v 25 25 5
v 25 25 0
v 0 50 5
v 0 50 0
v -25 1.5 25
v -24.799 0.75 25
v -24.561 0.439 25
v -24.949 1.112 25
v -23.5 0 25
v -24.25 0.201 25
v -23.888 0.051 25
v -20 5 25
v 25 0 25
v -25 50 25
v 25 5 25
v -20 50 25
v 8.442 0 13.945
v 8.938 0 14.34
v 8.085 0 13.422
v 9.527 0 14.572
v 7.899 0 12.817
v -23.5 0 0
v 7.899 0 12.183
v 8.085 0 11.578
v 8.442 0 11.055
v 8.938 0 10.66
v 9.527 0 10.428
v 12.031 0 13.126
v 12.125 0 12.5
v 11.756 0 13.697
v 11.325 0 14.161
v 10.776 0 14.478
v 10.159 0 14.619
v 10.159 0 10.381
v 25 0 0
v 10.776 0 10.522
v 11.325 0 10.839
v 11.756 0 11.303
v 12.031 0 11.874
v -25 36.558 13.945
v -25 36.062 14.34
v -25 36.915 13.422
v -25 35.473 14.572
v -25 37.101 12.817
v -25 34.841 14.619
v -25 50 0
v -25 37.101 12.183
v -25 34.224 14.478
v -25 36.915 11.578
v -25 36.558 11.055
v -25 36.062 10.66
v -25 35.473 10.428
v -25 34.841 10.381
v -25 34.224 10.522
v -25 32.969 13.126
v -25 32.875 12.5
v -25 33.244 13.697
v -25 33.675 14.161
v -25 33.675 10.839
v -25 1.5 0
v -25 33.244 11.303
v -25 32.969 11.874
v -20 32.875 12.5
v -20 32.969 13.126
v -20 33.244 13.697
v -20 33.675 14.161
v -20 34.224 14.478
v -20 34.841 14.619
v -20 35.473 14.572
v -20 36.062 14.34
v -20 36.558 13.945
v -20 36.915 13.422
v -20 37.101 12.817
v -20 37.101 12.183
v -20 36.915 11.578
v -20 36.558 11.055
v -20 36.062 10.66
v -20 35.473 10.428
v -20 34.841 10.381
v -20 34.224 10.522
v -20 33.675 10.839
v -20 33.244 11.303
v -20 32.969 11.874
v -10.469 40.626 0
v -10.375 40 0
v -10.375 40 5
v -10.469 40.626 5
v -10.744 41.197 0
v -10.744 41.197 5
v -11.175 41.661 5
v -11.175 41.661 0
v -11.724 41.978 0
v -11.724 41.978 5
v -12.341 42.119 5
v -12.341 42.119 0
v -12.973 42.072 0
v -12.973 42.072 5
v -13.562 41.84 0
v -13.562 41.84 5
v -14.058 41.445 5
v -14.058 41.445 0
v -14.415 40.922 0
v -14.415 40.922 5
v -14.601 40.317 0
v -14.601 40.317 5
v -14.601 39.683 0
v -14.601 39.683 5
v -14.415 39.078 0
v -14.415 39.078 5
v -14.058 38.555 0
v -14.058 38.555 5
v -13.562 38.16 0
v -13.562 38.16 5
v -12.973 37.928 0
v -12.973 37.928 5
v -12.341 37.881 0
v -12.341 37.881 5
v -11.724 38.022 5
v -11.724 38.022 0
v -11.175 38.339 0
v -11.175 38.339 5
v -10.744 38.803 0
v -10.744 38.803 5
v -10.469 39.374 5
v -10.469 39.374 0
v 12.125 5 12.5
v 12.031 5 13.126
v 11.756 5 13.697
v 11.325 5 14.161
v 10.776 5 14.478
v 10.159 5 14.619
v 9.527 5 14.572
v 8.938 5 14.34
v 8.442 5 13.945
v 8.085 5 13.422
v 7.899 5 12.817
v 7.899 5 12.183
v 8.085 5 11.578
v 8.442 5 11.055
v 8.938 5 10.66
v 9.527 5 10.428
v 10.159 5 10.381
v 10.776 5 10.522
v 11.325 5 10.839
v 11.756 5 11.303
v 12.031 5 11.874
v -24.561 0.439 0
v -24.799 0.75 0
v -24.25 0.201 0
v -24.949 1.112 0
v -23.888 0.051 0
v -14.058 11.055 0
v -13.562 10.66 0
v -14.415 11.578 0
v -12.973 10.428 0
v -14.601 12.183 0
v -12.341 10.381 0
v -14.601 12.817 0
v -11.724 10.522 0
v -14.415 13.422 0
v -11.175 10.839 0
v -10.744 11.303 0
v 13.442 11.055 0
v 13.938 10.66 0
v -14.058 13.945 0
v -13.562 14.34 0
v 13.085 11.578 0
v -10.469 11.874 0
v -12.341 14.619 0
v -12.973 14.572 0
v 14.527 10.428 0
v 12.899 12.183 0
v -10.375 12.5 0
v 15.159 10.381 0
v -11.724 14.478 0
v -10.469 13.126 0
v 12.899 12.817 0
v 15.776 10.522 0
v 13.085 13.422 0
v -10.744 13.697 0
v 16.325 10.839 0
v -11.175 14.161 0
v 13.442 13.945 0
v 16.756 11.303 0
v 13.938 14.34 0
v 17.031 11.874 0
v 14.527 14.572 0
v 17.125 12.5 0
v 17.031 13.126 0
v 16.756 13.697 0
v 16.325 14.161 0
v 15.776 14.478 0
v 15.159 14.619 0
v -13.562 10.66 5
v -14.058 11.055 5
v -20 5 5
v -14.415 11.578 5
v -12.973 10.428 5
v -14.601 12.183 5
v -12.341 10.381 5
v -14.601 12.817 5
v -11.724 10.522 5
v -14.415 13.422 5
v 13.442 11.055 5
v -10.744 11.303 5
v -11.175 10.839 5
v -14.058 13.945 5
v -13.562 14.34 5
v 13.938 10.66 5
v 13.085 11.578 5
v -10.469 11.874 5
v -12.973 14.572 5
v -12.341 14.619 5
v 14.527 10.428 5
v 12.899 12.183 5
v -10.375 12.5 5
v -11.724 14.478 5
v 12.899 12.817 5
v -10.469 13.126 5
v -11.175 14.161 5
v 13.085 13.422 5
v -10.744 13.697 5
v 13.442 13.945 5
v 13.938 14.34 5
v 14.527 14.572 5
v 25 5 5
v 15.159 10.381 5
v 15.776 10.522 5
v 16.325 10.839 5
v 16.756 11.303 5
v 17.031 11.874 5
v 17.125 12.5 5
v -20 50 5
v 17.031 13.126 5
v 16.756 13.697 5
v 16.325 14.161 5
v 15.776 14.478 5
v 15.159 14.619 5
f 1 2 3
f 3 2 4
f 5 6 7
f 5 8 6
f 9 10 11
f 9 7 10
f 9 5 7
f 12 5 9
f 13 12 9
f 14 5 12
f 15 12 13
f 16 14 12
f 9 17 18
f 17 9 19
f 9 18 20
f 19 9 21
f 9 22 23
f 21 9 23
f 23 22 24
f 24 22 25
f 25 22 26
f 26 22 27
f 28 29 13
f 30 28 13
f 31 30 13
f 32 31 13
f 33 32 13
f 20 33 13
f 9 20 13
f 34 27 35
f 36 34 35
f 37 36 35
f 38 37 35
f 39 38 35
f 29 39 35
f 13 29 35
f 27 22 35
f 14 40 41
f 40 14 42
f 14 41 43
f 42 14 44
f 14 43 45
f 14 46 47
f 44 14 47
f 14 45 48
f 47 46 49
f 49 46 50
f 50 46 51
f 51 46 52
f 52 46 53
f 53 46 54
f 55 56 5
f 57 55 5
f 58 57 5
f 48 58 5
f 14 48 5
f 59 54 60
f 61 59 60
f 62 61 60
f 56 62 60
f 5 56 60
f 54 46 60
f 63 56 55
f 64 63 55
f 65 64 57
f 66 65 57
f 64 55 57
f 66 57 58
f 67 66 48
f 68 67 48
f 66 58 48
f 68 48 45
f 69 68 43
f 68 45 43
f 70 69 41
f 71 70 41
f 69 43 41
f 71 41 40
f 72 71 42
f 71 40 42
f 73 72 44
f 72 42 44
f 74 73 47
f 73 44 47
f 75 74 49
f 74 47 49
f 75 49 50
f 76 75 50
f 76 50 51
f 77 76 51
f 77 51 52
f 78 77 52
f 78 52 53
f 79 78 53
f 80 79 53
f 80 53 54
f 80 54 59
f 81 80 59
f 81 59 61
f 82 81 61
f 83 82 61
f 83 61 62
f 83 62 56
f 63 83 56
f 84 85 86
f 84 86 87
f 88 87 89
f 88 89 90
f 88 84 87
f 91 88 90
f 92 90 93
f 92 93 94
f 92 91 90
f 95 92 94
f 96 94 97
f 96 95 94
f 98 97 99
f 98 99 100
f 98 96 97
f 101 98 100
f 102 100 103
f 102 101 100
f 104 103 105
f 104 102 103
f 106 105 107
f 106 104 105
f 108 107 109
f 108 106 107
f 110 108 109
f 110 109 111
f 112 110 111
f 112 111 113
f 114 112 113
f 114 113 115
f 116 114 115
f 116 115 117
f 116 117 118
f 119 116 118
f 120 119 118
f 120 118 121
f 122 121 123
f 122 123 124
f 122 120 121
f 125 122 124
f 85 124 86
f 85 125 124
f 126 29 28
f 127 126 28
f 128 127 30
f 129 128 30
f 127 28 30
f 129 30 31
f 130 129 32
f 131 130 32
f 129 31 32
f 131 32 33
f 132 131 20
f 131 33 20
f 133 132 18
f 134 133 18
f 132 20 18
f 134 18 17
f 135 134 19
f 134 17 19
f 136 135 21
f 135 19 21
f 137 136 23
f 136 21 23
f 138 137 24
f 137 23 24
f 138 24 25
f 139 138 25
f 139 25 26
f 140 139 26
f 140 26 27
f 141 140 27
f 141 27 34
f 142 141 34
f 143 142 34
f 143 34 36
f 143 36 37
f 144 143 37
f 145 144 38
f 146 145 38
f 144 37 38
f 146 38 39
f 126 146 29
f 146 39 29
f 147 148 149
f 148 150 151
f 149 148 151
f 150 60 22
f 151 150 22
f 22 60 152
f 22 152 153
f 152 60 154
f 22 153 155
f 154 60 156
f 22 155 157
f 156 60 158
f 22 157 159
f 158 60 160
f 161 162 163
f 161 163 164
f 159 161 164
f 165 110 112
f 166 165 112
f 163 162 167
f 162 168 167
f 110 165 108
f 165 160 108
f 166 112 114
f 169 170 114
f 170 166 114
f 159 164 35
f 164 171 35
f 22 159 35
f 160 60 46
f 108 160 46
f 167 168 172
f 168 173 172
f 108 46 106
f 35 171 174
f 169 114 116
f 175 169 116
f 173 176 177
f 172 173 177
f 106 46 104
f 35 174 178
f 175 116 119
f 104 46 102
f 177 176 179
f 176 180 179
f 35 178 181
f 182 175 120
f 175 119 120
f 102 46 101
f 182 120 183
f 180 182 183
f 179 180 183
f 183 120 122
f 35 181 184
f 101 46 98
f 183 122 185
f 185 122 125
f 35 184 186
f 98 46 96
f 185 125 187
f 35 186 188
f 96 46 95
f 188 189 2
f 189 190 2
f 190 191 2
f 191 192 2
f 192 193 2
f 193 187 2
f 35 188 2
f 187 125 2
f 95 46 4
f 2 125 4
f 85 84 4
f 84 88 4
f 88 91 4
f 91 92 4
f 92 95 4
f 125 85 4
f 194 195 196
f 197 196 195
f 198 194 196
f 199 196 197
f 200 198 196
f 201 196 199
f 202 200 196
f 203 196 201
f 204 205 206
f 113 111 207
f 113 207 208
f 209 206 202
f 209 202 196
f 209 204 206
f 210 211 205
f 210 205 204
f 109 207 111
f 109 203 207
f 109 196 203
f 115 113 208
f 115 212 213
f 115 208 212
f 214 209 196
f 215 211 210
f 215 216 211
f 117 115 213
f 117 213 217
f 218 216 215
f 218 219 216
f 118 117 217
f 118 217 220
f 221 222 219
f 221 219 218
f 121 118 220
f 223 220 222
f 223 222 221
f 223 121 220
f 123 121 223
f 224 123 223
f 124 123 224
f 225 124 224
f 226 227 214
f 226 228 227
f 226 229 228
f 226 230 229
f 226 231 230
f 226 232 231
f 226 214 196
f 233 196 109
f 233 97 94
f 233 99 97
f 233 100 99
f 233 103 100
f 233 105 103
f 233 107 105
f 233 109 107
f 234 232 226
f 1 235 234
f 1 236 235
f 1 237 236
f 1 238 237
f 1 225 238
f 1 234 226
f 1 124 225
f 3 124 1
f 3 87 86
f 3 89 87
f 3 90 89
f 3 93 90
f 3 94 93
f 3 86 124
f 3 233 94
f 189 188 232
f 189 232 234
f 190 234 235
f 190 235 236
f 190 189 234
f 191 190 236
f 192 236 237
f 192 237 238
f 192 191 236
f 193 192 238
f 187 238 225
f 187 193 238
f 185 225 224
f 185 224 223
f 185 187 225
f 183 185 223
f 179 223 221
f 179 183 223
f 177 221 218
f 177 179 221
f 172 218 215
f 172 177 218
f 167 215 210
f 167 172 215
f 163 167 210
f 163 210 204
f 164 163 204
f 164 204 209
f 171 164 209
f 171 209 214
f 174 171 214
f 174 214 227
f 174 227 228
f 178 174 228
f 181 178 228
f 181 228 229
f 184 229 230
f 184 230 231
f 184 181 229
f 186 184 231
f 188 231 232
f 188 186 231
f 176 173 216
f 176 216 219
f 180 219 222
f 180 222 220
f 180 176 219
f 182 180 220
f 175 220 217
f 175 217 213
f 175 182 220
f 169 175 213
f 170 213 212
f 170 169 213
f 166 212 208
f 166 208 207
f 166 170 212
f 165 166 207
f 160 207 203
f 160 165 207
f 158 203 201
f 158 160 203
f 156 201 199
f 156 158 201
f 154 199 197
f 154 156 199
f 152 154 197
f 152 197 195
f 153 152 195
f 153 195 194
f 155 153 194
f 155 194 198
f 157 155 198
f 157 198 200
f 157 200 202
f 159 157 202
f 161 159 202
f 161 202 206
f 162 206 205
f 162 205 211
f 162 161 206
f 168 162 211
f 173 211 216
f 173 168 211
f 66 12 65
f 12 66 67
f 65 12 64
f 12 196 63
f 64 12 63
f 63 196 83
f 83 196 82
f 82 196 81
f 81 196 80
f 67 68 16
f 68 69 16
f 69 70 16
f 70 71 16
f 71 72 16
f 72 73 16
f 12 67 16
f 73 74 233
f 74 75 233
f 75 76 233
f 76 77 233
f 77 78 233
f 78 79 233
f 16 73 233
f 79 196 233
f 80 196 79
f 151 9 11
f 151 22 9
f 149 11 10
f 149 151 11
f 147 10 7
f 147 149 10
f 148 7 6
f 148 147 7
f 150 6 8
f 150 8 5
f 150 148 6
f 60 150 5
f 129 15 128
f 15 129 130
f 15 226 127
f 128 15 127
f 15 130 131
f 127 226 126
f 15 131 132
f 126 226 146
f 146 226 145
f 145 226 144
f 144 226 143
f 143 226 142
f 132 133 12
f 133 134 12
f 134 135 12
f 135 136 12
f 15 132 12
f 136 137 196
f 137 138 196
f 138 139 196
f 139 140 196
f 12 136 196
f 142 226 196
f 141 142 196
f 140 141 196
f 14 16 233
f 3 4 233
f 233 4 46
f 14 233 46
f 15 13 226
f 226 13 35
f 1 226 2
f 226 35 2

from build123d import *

# Parameters (mm, degrees)
F0_R      = 2.125
F1_DEPTH  = 5
F3_DEPTH  = 20
F4_R      = 2.125
F5_DEPTH  = 5
F7_DEPTH  = 5
F8_R      = 1.5
F9_R      = 2.125
F10_DEPTH = 25


with BuildPart() as f1:
    # F0 (on Top) → F1 (new body)
    with BuildSketch(Plane.XY):
        Polygon((0, 25), (0, 50), (-25, 50), (-25, 0), (25, 0), (25, 25), align=None)
        with Locations((-12.5, 12.5)):
            Circle(F0_R, mode=Mode.SUBTRACT)
        with Locations((15, 12.5)):
            Circle(F0_R, mode=Mode.SUBTRACT)
        with Locations((-12.5, 40)):
            Circle(F0_R, mode=Mode.SUBTRACT)
    extrude(amount=F1_DEPTH)

    # F2 (on face) → F3 (join)
    with BuildSketch(Plane.XY.offset(5)):
        Polygon((25, 5), (-20, 5), (-20, 50), (-25, 50), (-25, 0), (-20, 0), (25, 0), align=None)
    extrude(amount=F3_DEPTH)

    # F4 (on face) → F5 (cut)
    with BuildSketch(Plane.XZ):
        with Locations((10, 12.5)):
            Circle(F4_R)
    extrude(amount=-F5_DEPTH, mode=Mode.SUBTRACT)

    # F6 (on Top) → F7 (join)
    with BuildSketch(Plane.XY):
        Polygon((25, 25), (0, 50), (0, 25), align=None)
    extrude(amount=F7_DEPTH)

    # F8
    f8_edges = [f1.edges().sort_by_distance(p)[0] for p in [
        (-25, 0, 12.5),
    ]]
    fillet(f8_edges, radius=F8_R)

    # F9 (on face) → F10 (cut)
    with BuildSketch(Plane(origin=(-25, 0, 0), x_dir=(0, -1, 0), z_dir=(-1, 0, 0))):
        with Locations((-35, 12.5)):
            Circle(F9_R)
    extrude(amount=-F10_DEPTH, mode=Mode.SUBTRACT)


solid = f1.part
